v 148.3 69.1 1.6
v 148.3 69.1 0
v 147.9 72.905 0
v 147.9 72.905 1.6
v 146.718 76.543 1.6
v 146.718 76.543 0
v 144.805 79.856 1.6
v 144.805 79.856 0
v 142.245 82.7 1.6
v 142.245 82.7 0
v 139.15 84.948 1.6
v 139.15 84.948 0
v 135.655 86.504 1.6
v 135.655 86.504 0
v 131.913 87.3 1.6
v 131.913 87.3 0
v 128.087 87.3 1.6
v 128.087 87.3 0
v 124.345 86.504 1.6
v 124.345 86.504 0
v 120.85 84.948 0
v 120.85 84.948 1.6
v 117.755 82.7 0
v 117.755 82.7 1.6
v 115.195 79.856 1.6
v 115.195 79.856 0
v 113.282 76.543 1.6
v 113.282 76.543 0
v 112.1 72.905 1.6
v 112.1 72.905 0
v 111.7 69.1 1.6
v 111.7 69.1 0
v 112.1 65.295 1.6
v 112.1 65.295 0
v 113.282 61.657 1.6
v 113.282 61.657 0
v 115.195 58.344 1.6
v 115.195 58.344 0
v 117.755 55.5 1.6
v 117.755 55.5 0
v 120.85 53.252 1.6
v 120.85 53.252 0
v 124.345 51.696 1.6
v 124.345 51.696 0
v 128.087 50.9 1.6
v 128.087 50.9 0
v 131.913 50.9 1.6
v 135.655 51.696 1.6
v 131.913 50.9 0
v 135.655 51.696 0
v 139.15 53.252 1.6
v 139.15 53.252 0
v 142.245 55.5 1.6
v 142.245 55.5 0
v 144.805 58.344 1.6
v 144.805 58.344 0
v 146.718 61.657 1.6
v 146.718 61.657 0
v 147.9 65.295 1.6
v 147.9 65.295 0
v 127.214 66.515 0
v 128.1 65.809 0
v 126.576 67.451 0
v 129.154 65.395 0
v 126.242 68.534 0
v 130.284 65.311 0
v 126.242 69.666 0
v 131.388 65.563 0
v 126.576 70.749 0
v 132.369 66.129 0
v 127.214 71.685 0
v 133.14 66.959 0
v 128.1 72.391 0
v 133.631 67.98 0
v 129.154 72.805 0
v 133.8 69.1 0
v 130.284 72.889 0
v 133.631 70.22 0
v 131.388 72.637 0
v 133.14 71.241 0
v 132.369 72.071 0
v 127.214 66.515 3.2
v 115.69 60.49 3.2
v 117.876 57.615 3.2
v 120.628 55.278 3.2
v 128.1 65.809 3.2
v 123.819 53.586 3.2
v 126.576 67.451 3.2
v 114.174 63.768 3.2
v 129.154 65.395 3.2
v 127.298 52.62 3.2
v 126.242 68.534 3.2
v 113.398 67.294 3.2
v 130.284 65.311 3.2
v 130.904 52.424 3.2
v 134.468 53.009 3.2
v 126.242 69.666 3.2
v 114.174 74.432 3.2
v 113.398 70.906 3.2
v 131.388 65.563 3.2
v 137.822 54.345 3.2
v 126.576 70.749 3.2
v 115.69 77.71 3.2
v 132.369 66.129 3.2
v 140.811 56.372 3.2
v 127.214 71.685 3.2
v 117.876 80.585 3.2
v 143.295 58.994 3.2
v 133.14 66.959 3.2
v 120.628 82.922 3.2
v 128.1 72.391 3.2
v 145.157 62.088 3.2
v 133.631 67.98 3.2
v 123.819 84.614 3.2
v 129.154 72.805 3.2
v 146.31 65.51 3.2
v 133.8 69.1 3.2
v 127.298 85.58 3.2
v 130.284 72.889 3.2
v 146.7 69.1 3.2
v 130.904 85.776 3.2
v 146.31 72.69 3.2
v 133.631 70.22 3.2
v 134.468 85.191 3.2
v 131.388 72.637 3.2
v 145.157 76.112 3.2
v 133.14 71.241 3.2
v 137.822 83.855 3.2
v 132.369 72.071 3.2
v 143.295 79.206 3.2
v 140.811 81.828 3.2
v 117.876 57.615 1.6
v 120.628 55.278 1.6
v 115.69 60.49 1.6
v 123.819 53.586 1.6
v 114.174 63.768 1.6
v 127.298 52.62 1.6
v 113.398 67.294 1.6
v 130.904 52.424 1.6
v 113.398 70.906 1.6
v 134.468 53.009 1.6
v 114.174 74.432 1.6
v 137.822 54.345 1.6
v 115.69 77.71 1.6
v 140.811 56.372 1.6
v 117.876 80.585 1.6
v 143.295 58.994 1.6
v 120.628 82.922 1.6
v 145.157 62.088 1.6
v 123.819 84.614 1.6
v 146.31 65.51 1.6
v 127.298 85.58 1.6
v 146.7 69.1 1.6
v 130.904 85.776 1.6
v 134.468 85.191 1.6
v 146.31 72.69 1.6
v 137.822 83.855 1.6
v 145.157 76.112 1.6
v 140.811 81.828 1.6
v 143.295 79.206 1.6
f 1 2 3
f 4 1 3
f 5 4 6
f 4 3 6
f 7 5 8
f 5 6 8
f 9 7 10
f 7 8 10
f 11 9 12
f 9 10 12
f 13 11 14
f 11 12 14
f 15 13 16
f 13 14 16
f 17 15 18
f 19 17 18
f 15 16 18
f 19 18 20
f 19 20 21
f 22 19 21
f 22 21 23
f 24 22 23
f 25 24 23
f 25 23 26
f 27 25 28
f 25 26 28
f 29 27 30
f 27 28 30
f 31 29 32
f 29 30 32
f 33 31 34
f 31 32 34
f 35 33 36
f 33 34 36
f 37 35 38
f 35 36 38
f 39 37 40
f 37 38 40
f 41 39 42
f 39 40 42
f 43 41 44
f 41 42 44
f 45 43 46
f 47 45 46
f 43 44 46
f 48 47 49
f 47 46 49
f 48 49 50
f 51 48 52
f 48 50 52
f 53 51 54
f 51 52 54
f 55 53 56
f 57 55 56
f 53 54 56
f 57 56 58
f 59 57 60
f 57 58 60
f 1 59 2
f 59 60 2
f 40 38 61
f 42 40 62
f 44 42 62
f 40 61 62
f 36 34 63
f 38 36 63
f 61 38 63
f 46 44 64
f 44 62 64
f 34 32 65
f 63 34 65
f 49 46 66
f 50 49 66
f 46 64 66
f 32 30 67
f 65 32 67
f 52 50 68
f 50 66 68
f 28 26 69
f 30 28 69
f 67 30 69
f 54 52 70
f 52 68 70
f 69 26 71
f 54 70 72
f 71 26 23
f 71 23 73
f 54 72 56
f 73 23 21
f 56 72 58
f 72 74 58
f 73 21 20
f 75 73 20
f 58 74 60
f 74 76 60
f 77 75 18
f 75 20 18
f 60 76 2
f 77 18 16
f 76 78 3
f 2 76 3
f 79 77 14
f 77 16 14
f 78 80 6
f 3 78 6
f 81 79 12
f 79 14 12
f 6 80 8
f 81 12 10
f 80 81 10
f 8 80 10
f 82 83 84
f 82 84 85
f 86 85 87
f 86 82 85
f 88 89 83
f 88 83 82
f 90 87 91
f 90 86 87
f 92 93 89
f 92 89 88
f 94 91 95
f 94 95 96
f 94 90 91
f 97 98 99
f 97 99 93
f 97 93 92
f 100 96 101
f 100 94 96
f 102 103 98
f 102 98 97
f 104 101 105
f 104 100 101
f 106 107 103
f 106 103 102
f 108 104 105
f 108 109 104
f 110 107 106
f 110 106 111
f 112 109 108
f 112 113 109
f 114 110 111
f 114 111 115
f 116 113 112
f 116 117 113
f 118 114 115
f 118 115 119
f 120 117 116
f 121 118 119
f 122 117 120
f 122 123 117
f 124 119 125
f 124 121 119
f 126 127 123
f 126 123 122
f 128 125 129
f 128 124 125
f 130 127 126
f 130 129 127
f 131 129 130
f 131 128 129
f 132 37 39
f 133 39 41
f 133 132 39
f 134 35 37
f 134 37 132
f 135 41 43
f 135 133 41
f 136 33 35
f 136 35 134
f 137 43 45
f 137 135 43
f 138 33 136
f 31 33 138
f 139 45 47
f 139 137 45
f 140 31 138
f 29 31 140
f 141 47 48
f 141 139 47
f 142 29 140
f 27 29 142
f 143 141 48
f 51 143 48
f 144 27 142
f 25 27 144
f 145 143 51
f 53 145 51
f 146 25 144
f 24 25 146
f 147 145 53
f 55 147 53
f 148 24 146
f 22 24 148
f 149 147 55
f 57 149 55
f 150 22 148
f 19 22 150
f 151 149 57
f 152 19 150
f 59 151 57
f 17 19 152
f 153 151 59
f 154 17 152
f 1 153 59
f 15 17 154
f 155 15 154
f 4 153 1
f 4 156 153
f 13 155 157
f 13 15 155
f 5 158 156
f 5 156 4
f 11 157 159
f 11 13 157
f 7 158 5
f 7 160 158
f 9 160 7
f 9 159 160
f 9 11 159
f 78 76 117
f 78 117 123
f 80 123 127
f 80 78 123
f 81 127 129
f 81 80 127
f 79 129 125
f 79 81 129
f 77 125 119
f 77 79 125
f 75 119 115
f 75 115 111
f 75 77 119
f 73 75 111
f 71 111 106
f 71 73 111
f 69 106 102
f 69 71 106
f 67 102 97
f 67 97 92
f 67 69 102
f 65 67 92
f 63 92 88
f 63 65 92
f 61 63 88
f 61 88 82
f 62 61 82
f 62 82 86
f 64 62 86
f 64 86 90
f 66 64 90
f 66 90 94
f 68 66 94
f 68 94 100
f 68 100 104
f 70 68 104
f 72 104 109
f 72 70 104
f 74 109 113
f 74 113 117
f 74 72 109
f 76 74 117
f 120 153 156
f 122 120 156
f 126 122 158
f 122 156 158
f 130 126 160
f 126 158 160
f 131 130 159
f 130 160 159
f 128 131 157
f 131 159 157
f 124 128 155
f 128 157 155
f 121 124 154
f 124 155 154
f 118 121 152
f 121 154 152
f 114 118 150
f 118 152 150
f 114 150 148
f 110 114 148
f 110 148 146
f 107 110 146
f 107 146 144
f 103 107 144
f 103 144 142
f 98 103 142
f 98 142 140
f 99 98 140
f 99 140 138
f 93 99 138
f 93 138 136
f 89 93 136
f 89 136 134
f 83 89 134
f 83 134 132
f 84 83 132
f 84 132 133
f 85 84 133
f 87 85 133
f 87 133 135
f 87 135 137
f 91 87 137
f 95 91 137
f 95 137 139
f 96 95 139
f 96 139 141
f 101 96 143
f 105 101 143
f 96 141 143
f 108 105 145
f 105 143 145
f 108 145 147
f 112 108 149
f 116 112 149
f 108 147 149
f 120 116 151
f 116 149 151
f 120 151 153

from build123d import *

# Parameters (mm, degrees)
CYLINDER015_R     = 3.8
CYLINDER015_DEPTH = 3.2
CYLINDER014_R     = 18.3
CYLINDER014_DEPTH = 1.6
CYLINDER013_R     = 16.7
CYLINDER013_DEPTH = 3.2


with BuildPart() as zylinder015:
    # Cylinder015 → Cylinder015 (new body)
    with BuildSketch(Plane(origin=(130, 69.1, 0), x_dir=(1, 0, 0), z_dir=(0, 0, 1))):
        Circle(CYLINDER015_R)
    extrude(amount=CYLINDER015_DEPTH)


with BuildPart() as zylinder014:
    # Cylinder014 → Cylinder014 (new body)
    with BuildSketch(Plane(origin=(130, 69.1, 0), x_dir=(1, 0, 0), z_dir=(0, 0, 1))):
        Circle(CYLINDER014_R)
    extrude(amount=CYLINDER014_DEPTH)


with BuildPart() as ring:
    # Cylinder013 → Cylinder013 (new body)
    with BuildSketch(Plane(origin=(130, 69.1, 0), x_dir=(1, 0, 0), z_dir=(0, 0, 1))):
        Circle(CYLINDER013_R)
    extrude(amount=CYLINDER013_DEPTH)

    # Fusion010: union Zylinder014
    add(zylinder014.part)

    # Cut007: cut Zylinder015
    add(zylinder015.part, mode=Mode.SUBTRACT)


solid = ring.part
